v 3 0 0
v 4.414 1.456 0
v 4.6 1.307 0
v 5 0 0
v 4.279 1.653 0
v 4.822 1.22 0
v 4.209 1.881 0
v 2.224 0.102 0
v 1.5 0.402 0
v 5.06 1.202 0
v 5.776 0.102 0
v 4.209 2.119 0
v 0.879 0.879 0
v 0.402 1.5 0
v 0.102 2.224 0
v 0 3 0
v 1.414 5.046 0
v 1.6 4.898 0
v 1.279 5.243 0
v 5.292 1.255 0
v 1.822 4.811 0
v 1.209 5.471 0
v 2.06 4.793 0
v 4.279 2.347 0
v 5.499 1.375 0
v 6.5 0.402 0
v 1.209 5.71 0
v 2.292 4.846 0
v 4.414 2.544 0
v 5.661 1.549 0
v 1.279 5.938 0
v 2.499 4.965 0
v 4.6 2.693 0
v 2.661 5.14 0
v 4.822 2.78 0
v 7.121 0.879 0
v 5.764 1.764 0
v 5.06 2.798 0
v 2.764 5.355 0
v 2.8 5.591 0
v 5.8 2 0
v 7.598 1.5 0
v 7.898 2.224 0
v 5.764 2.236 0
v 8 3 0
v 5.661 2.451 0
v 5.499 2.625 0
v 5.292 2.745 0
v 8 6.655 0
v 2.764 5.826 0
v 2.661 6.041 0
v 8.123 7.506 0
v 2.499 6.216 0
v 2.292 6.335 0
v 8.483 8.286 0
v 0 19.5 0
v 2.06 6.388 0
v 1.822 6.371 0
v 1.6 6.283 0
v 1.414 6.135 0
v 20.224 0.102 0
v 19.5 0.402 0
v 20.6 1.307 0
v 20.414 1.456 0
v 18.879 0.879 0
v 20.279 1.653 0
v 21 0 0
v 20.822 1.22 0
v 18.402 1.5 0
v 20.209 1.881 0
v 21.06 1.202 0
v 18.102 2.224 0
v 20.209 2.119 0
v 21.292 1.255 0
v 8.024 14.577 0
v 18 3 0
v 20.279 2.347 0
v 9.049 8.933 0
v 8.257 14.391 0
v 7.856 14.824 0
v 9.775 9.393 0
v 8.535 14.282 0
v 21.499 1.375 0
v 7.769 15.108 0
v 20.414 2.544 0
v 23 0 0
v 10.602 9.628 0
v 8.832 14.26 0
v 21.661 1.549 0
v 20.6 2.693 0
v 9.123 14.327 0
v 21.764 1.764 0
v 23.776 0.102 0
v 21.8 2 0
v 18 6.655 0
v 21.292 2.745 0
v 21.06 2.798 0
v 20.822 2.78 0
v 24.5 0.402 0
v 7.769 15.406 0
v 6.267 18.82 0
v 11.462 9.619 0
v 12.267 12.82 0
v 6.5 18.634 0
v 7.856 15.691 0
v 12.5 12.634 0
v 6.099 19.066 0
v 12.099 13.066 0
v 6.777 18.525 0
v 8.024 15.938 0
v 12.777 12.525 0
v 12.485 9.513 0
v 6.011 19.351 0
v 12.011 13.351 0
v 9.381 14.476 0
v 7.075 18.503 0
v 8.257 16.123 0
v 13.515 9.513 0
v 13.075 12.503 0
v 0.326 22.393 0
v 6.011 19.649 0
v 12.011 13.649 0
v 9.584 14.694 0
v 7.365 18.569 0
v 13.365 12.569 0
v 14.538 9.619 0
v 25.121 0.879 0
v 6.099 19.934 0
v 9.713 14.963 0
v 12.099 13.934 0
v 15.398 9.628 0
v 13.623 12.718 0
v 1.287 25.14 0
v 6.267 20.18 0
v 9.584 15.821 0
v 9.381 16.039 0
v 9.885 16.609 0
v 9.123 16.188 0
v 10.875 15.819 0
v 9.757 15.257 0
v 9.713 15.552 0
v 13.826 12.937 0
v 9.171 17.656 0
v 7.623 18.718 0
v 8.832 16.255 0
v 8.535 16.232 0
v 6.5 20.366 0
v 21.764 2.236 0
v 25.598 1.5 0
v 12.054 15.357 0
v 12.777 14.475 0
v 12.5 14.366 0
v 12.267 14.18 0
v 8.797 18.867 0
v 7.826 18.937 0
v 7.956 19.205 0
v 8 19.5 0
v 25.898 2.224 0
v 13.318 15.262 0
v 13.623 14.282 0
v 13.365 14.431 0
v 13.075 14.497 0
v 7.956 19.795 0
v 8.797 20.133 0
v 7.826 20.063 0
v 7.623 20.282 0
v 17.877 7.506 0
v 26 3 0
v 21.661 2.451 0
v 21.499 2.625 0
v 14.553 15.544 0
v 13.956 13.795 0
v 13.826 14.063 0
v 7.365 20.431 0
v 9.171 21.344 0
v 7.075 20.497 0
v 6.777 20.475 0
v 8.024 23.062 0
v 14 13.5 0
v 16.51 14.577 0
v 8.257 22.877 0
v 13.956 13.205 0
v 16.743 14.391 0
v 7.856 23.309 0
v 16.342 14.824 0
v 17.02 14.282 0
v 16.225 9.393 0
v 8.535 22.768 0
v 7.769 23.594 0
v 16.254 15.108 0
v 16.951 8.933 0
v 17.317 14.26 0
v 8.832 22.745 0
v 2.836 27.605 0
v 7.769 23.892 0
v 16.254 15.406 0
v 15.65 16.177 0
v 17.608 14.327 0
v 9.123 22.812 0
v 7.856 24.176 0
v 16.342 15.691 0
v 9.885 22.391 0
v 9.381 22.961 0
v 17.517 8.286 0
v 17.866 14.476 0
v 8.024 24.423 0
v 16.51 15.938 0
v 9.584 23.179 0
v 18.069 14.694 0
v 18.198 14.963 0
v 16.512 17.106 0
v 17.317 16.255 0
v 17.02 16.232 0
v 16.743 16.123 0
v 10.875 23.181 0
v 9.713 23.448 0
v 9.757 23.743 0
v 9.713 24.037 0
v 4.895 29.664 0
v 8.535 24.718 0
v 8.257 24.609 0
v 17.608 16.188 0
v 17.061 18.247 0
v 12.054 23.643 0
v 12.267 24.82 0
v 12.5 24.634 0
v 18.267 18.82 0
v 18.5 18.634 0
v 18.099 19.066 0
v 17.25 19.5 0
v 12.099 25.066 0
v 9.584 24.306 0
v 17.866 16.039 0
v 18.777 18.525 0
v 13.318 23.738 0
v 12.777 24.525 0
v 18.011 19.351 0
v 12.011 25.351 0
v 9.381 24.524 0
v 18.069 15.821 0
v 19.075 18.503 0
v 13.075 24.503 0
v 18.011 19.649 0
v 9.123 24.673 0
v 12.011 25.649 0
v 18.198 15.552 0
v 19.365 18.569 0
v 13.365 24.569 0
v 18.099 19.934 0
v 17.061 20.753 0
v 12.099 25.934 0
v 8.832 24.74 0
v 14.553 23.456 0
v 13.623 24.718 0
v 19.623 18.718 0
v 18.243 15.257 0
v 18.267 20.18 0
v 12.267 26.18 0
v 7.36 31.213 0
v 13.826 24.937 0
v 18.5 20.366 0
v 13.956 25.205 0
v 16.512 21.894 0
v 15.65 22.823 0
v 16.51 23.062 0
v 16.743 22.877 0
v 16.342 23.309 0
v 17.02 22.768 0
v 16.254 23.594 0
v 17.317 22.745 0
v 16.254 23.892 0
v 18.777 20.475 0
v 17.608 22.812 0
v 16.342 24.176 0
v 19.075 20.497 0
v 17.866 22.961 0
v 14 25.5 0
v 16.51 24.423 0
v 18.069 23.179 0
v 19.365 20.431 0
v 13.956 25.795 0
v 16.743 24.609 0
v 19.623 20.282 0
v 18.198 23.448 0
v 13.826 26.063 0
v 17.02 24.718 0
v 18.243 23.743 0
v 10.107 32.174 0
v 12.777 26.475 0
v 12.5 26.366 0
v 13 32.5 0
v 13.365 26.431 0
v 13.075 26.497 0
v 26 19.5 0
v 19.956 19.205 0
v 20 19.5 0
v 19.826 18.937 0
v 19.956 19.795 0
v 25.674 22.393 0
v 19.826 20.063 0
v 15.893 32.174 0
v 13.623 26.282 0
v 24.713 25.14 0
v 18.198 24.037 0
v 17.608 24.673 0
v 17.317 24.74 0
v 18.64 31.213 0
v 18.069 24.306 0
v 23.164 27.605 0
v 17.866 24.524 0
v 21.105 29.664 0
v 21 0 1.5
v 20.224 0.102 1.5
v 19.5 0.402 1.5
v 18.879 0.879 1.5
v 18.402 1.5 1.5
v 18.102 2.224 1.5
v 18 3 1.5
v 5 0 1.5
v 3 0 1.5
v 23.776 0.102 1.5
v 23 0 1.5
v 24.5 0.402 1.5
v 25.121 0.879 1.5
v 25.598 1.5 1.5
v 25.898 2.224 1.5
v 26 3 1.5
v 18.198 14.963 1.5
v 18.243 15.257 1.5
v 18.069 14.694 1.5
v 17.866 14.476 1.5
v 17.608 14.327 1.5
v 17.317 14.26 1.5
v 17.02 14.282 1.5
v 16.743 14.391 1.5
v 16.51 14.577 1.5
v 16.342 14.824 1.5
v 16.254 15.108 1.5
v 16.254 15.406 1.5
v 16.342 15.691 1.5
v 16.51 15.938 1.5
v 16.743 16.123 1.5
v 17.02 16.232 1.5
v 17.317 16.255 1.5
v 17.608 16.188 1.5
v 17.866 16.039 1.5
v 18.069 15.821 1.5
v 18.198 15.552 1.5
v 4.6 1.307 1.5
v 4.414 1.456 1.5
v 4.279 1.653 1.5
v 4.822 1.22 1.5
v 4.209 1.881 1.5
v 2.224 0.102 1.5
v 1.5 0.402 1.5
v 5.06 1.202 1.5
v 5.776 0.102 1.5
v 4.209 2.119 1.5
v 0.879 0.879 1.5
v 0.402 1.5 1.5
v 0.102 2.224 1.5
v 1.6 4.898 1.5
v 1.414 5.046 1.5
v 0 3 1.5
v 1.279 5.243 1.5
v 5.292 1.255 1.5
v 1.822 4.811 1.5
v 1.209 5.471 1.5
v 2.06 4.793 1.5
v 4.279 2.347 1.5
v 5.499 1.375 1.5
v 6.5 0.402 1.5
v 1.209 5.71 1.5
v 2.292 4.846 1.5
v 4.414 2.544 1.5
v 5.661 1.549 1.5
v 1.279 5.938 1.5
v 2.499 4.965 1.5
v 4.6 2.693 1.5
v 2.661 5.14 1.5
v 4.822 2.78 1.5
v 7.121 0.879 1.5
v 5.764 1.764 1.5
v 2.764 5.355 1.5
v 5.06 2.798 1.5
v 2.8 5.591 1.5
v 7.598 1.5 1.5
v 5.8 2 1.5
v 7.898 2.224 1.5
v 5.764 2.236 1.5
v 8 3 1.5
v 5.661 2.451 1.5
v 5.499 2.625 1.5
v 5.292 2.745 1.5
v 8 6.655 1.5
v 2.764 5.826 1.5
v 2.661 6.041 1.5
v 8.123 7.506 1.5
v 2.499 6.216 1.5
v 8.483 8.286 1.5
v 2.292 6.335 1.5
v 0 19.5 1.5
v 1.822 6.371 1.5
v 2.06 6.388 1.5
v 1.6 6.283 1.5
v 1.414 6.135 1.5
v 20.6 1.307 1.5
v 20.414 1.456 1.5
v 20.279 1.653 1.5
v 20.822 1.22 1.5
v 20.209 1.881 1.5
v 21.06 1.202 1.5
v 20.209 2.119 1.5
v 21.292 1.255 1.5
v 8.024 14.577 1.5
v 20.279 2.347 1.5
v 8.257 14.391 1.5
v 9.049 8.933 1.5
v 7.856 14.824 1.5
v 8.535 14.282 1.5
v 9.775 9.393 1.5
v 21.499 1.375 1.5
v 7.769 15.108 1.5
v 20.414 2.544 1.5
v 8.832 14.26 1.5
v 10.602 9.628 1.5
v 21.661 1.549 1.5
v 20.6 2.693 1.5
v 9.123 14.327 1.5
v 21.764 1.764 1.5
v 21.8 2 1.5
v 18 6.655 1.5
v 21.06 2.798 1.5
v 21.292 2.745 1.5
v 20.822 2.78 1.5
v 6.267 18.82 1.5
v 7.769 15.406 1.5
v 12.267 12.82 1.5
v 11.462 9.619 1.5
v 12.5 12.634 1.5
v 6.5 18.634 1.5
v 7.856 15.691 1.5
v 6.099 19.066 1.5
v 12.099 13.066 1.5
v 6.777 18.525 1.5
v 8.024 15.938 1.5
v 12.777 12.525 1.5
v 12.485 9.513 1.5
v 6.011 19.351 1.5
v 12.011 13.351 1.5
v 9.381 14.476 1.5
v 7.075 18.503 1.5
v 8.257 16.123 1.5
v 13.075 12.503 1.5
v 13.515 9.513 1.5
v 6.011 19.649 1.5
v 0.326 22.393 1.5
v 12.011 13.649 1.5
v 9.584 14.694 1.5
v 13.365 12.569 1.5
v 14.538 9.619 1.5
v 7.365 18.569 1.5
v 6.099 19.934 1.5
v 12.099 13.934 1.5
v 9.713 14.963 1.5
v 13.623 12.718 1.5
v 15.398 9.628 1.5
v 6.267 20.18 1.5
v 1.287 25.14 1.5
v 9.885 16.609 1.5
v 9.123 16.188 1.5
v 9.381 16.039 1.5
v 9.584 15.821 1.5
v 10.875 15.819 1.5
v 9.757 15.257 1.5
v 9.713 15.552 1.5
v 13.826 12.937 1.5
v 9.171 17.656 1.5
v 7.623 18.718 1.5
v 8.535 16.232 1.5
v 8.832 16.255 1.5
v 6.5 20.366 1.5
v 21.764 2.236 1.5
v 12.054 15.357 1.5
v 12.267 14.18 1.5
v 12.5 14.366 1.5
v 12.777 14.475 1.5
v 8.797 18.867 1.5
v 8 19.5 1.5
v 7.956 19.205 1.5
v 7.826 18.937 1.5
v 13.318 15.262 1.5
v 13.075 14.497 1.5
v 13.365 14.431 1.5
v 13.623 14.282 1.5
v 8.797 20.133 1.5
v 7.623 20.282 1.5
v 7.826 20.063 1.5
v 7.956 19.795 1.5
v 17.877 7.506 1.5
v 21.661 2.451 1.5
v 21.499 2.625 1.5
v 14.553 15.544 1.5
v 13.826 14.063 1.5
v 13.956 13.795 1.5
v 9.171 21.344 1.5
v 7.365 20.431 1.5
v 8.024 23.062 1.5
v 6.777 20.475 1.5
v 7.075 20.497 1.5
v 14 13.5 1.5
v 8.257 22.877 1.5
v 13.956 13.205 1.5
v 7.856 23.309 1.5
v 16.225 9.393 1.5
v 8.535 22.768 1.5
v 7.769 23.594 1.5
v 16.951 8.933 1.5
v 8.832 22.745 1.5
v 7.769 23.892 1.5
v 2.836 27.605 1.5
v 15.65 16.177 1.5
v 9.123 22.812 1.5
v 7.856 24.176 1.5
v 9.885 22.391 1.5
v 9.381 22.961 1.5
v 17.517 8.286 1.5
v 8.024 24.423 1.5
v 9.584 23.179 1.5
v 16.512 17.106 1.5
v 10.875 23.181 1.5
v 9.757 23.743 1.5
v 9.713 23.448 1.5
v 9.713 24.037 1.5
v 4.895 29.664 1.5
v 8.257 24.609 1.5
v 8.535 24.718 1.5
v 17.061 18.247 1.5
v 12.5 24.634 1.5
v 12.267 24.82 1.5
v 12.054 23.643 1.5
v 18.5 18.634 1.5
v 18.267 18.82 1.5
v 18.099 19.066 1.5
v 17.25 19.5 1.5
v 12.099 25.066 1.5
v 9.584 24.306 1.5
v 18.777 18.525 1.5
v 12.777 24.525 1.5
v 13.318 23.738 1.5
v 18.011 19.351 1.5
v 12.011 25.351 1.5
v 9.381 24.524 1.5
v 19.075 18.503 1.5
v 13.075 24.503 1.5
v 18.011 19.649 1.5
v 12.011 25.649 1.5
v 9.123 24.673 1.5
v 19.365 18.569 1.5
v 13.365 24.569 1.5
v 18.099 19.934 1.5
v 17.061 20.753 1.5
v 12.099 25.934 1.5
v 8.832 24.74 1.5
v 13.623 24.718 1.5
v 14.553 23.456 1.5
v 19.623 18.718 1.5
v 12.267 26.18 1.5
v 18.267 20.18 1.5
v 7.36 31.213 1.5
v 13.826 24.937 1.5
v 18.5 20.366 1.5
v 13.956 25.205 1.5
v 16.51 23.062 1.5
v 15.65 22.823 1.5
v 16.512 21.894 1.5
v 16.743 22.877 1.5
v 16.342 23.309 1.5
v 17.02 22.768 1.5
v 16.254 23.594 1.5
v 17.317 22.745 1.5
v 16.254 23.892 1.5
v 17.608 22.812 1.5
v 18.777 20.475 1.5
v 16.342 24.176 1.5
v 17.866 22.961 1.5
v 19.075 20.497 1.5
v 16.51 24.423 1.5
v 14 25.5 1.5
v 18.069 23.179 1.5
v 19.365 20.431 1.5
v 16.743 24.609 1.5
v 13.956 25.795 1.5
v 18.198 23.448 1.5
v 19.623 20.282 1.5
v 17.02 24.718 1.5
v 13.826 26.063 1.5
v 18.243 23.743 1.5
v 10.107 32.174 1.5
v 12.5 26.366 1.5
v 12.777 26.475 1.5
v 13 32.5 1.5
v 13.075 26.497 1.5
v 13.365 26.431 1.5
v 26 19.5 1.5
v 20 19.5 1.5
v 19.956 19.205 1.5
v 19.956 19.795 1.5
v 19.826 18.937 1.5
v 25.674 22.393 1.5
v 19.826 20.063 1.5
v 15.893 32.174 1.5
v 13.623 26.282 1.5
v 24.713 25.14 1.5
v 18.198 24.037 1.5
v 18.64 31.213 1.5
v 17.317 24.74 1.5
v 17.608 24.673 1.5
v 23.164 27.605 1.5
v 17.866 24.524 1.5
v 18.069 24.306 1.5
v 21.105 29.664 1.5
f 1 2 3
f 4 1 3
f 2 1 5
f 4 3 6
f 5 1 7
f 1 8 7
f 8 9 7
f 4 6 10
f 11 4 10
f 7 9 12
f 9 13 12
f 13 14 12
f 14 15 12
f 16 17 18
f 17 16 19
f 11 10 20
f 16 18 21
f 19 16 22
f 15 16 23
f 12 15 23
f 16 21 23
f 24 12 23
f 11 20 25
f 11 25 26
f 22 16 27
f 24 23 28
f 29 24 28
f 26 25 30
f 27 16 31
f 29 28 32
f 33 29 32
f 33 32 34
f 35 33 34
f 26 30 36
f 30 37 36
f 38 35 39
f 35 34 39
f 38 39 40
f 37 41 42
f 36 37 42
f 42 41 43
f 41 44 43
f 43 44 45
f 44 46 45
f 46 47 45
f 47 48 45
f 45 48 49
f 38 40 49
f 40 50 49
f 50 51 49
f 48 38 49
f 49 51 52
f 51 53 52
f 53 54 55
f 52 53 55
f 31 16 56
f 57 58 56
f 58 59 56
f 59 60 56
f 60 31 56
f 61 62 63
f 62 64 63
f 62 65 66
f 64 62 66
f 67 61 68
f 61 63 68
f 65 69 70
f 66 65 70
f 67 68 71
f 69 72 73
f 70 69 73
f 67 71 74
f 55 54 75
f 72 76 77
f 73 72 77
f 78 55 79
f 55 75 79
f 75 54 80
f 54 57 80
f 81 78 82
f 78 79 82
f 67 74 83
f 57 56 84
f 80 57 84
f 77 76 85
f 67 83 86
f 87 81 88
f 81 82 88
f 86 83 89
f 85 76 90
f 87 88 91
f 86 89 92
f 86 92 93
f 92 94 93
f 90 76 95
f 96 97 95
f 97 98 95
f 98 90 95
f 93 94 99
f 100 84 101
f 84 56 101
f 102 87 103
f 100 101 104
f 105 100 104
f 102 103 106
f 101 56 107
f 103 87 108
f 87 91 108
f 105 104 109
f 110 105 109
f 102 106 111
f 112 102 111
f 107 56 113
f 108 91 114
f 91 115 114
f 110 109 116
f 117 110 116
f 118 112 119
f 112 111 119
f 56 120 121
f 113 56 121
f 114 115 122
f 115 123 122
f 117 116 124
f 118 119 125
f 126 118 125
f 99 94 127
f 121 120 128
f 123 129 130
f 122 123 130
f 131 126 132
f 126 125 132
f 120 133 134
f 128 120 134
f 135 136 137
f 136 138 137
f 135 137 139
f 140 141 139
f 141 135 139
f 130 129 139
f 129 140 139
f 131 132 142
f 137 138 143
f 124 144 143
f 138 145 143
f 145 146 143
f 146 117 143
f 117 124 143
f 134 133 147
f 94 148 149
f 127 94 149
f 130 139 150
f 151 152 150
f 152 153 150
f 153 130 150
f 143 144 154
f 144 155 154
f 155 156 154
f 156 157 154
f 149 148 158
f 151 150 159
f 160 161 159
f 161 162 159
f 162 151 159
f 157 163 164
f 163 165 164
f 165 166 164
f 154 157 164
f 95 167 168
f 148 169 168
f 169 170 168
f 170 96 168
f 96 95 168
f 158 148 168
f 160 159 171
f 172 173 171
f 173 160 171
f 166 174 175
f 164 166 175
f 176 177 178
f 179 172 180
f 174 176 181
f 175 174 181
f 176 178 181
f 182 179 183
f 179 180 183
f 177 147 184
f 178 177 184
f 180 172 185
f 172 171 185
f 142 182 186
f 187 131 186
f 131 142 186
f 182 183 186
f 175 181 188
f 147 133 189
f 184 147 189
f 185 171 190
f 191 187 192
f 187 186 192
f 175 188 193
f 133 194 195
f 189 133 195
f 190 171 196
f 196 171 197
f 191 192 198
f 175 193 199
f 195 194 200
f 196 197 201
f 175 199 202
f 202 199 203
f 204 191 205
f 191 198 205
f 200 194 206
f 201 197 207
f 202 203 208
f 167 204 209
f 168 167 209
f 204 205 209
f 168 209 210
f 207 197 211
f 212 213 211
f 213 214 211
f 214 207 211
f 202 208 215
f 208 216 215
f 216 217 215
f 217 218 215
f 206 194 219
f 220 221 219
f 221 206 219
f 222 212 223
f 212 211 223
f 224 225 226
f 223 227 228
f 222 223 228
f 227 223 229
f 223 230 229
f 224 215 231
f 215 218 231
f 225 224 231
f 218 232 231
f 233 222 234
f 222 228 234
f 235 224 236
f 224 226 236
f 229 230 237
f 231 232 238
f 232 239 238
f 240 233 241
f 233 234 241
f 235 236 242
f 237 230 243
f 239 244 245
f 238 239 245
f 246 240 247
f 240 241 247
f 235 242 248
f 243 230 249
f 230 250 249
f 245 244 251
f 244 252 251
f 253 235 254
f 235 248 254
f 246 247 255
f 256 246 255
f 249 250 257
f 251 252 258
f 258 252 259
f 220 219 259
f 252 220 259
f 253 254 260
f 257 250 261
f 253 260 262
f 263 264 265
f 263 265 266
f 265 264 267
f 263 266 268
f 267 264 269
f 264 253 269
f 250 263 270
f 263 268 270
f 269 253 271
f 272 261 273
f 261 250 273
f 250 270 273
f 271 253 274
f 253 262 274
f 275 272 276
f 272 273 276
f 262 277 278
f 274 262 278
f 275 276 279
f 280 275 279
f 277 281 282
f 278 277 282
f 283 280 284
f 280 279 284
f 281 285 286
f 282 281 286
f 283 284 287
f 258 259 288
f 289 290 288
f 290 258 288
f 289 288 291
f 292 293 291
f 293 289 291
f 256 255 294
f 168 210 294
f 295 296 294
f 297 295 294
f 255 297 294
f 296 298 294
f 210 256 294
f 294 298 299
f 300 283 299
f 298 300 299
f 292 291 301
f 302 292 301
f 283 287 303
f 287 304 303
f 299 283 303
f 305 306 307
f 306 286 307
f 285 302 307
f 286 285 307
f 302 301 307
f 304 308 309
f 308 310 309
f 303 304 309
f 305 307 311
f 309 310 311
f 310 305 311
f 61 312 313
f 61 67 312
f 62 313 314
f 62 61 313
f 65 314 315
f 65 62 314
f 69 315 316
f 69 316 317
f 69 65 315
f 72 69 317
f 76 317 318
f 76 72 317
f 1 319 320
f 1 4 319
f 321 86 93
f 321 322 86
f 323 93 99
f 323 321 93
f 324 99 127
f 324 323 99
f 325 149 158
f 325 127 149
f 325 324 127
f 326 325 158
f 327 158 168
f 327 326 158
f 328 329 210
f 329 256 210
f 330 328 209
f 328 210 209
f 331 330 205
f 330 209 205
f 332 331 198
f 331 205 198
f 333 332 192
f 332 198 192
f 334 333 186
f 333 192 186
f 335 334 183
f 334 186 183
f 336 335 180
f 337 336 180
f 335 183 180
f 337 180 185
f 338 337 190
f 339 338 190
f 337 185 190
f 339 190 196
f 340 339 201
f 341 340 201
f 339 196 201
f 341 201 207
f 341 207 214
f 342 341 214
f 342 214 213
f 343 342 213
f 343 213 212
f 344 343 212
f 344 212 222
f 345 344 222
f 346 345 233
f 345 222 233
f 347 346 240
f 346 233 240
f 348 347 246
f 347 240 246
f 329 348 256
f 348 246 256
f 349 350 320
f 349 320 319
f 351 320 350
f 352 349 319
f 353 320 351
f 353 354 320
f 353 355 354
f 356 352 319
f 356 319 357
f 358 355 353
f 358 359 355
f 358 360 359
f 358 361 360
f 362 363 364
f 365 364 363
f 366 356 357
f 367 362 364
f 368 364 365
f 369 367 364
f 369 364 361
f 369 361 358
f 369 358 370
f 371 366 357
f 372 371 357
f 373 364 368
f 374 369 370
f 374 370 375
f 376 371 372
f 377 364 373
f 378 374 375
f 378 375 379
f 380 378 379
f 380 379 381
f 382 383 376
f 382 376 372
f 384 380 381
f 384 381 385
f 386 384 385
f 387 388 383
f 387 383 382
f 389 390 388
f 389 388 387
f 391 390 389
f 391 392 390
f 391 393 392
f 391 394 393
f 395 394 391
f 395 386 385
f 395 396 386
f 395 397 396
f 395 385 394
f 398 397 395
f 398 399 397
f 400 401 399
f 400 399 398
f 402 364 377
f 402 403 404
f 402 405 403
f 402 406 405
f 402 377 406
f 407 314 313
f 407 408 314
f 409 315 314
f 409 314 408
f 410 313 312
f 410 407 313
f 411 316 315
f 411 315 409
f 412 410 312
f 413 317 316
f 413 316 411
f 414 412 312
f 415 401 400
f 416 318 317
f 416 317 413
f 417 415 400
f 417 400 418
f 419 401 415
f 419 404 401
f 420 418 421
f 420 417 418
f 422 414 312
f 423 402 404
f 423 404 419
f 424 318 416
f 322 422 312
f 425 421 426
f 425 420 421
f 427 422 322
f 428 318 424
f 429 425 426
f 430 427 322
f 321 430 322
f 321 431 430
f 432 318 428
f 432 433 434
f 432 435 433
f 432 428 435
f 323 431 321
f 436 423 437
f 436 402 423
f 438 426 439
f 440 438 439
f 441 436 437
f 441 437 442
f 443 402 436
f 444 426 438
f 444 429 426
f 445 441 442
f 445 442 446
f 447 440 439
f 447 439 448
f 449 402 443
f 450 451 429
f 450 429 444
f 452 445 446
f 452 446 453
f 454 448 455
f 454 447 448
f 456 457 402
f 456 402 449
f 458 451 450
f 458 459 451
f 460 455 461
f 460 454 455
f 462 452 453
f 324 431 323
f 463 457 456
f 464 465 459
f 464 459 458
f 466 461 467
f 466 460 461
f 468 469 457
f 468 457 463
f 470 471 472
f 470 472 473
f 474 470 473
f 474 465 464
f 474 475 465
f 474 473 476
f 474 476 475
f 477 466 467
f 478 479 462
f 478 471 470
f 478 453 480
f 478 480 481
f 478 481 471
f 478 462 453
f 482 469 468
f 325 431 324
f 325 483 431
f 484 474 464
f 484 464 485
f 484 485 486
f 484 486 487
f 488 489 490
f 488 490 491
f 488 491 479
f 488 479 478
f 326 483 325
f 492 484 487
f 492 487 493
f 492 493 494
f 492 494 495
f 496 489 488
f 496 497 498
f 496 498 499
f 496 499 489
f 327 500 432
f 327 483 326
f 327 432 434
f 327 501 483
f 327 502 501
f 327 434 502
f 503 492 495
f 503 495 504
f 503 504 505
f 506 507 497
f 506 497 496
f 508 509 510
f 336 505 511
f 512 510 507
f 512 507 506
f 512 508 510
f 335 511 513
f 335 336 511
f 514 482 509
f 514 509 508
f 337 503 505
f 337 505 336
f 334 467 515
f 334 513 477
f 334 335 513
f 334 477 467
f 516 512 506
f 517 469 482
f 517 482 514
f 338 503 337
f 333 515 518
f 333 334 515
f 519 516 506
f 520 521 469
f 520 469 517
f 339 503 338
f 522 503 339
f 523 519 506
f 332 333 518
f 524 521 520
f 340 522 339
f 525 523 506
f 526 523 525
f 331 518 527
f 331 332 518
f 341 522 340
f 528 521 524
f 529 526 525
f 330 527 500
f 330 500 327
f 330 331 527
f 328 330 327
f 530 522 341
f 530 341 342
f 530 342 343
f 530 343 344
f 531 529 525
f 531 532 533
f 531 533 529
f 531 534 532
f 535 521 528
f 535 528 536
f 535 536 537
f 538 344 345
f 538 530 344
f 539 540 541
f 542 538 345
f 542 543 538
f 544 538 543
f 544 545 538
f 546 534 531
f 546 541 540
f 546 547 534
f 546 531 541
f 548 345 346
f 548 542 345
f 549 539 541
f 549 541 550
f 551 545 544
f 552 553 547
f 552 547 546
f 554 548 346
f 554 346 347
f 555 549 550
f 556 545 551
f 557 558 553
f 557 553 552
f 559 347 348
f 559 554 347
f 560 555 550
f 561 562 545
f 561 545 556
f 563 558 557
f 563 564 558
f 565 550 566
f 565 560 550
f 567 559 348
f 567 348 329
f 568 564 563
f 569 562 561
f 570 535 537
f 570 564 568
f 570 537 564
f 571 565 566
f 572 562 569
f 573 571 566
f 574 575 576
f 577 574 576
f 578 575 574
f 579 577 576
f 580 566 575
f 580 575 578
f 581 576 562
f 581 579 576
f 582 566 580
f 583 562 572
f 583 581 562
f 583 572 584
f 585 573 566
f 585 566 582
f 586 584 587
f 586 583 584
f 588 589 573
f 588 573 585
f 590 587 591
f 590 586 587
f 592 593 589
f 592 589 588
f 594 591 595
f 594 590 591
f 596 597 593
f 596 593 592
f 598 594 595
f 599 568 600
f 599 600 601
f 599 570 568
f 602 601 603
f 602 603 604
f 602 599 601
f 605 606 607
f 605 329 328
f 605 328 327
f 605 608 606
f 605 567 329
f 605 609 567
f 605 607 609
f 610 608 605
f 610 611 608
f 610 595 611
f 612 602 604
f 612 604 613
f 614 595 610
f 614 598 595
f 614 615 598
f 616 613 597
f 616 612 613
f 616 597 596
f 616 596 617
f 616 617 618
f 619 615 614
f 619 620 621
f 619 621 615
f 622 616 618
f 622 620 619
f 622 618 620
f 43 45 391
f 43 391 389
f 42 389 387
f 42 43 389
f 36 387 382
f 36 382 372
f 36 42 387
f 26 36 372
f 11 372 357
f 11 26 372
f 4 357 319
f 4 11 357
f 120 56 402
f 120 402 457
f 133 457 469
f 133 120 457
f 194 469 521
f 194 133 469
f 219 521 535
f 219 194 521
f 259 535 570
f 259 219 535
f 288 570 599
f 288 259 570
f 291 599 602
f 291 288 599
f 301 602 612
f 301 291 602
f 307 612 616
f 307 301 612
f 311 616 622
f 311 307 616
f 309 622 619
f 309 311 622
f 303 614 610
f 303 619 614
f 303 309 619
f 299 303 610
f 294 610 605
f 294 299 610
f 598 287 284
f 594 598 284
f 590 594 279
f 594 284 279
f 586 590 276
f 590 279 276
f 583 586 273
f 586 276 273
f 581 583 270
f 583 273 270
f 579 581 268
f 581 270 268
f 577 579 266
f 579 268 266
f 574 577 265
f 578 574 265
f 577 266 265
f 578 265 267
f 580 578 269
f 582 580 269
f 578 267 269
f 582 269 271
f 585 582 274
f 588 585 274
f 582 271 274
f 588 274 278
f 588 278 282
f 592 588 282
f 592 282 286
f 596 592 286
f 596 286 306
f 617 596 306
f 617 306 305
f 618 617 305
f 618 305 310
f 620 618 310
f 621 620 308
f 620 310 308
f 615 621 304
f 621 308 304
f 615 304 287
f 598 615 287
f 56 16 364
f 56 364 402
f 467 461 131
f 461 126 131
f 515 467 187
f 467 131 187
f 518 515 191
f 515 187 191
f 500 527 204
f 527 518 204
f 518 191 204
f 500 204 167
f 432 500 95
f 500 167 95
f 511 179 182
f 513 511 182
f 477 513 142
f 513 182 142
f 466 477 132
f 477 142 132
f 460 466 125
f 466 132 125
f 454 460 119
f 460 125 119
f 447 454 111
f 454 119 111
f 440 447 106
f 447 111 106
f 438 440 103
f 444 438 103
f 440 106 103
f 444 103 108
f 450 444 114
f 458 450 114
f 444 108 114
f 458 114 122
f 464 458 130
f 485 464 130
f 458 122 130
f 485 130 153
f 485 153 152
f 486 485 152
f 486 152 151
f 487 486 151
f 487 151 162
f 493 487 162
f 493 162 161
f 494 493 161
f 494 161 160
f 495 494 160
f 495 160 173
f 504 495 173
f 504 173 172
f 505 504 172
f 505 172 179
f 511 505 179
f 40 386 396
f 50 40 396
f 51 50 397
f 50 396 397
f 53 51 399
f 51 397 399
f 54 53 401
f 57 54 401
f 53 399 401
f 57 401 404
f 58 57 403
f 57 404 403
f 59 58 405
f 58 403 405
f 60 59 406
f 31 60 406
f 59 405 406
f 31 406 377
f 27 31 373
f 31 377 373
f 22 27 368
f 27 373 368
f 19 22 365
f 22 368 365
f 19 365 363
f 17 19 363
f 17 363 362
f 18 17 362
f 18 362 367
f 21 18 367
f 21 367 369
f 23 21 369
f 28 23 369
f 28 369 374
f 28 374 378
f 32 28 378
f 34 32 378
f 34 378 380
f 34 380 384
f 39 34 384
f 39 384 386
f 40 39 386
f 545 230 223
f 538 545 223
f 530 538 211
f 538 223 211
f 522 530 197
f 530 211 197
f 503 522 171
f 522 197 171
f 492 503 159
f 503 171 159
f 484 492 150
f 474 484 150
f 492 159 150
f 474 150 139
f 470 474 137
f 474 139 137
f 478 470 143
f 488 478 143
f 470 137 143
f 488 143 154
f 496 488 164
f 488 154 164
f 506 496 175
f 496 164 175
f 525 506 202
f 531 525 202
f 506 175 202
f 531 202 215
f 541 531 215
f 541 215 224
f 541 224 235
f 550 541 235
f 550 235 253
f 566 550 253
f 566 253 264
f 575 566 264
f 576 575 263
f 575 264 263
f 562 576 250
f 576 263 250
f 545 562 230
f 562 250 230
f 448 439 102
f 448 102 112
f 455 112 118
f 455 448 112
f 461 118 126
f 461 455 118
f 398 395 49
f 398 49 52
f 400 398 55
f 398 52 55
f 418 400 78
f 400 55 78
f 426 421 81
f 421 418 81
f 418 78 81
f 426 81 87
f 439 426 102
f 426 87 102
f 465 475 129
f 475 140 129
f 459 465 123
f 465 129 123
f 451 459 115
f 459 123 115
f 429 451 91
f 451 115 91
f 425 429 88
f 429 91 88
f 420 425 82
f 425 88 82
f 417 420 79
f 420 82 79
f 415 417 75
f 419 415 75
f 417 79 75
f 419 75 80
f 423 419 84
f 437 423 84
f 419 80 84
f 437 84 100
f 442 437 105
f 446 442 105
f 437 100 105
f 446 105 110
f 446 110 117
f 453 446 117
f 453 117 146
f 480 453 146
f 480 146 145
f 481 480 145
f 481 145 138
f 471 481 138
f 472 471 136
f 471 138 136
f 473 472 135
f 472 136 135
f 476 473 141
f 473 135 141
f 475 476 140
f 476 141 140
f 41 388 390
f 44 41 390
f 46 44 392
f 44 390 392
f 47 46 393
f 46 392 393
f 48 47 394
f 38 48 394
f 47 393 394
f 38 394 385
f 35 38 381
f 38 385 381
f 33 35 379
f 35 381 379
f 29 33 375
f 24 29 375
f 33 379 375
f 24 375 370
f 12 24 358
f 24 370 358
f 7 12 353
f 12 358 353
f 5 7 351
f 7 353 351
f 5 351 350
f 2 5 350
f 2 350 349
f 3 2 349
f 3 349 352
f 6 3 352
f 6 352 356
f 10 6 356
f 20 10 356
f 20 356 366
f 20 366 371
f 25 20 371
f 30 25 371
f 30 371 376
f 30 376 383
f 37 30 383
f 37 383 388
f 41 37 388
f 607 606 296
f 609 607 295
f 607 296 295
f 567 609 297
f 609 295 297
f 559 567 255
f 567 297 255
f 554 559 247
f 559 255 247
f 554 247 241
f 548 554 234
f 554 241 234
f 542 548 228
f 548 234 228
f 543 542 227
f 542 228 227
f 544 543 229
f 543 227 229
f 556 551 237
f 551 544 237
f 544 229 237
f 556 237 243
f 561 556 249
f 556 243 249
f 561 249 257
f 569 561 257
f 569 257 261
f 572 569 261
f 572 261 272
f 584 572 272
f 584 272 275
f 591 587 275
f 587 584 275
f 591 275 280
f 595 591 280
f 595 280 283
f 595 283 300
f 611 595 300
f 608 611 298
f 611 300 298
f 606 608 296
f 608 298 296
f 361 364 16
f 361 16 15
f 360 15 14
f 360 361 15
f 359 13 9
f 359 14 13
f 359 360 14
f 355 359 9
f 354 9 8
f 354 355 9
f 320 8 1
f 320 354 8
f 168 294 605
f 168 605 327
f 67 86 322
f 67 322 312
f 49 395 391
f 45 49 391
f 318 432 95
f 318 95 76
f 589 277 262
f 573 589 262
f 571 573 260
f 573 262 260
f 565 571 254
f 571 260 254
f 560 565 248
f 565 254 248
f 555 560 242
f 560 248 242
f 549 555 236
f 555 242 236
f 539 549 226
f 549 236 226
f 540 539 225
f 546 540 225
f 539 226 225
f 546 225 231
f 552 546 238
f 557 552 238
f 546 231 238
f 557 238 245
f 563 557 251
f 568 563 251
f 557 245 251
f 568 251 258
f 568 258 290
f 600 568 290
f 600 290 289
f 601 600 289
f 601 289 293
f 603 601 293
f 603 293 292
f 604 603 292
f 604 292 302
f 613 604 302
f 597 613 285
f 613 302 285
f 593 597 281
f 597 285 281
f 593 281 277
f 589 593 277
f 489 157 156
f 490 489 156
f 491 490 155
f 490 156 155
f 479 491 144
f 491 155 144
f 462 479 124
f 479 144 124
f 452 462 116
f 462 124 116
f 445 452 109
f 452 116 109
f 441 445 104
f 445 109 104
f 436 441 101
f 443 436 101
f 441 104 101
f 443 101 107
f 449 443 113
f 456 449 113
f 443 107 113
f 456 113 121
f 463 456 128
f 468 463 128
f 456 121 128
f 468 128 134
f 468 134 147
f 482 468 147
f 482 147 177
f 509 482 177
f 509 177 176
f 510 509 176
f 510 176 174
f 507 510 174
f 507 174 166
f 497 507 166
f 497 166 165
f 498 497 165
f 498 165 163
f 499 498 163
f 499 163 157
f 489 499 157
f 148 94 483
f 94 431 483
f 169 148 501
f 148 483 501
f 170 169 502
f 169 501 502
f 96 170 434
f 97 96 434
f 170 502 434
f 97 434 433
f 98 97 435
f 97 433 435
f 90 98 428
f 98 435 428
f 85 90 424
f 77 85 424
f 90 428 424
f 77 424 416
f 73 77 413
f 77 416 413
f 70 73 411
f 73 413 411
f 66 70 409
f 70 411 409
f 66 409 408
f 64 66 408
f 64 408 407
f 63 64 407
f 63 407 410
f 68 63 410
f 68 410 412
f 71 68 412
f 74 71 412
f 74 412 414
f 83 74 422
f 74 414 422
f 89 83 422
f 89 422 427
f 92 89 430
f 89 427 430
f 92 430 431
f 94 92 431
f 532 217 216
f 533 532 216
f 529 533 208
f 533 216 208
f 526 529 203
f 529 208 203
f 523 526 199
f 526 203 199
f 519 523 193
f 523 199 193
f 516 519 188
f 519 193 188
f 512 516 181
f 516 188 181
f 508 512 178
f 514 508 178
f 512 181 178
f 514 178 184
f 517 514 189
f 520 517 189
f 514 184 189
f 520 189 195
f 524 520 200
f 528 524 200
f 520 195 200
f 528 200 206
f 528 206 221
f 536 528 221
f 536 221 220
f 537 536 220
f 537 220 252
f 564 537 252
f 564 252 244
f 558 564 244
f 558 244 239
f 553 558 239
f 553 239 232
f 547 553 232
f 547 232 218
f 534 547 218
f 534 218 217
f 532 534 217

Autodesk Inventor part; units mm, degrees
ref_plane "YZ Plane" through (0, 0, 0) normal (1, 0, 0) x (0, 1, 0)
ref_plane "XZ Plane" through (0, 0, 0) normal (0, 1, 0) x (-1, 0, 0)
ref_plane "XY Plane" through (0, 0, 0) normal (0, 0, 1) x (1, 0, 0)
sketch "スケッチ1" plane through (0, 0, 0) normal (0, 0, 1) x (1, 0, 0)
  line L0 (0, 19.5) -> (26, 19.5)
  line L1 (26, 19.5) -> (26, 0)
  line L2 (26, 0) -> (0, 0)
  line L3 (0, 0) -> (0, 19.5)
  circle A0 centre (13, 19.5) radius 13
  circle A1 centre (13, 19.5) radius 4.25
  circle A2 centre (13, 19.5) radius 6
  circle A3 centre (13, 25.5) radius 1
  circle A4 centre (8.7574, 23.7426) radius 1
  circle A5 centre (7, 19.5) radius 1
  circle A6 centre (8.7574, 15.2574) radius 1
  circle A7 centre (13, 13.5) radius 1
  circle A8 centre (17.2426, 15.2574) radius 1
  circle A9 centre (19, 19.5) radius 1
  circle A10 centre (17.2426, 23.7426) radius 1
  point P0 (0, 19.5)
  dimension "d3" = 12
  dimension "d0" = 19.5
  dimension "d1" = 26
  dimension "d2" = 8.5
  dimension "d4" = 2
  dimension "d7" = 360
extrude "押し出し1" add sketch "スケッチ1" along normal blind 1.5 contours A9 A2 A10 A3 A4 A5 L0 A0 | L0 A0 A5 A2 A6 A7 A8 A9 | A9 A2 A8 A7 A6 A5 L0 A1 | L0 A1 A5 A2 A4 A3 A10 A9 | L1 L2 L3 A0
sketch "スケッチ2" plane through (0, 0, 1.5) normal (0, 0, 1) x (1, 0, 0)
  circle A0 centre (2, 5.5906) radius 0.8 projected
  circle A1 centre (5, 2) radius 0.8 projected
  circle A2 centre (21, 2) radius 0.8 projected
  circle A3 centre (13, 19.5) radius 4.25 projected
  circle A4 centre (13, 19.5) radius 10
  line L0 (0, 0) -> (26, 0) projected
  line L1 (8, 10.8397) -> (8, 0)
  line L2 (18, 10.8397) -> (18, 0)
  point P0 (2, 0)
  point P1 (24, 0)
  dimension "d14" = 20
  dimension "d16" = 3
  dimension "d17" = 3
extrude "押し出し2" cut sketch "スケッチ2" against normal through all contours A0 | A1 | A2 | A4 L2 L0 L1
fillet "フィレット2" radius 3 6 edges at (0, 0, 0.75) (8, 0, 0.75) (8, 10.8397, 0.75) (18, 10.8397, 0.75) (18, 0, 0.75) (26, 0, 0.75)
properties part number "hipjoint_toleg_upper" material "アルミニウム 6061"
